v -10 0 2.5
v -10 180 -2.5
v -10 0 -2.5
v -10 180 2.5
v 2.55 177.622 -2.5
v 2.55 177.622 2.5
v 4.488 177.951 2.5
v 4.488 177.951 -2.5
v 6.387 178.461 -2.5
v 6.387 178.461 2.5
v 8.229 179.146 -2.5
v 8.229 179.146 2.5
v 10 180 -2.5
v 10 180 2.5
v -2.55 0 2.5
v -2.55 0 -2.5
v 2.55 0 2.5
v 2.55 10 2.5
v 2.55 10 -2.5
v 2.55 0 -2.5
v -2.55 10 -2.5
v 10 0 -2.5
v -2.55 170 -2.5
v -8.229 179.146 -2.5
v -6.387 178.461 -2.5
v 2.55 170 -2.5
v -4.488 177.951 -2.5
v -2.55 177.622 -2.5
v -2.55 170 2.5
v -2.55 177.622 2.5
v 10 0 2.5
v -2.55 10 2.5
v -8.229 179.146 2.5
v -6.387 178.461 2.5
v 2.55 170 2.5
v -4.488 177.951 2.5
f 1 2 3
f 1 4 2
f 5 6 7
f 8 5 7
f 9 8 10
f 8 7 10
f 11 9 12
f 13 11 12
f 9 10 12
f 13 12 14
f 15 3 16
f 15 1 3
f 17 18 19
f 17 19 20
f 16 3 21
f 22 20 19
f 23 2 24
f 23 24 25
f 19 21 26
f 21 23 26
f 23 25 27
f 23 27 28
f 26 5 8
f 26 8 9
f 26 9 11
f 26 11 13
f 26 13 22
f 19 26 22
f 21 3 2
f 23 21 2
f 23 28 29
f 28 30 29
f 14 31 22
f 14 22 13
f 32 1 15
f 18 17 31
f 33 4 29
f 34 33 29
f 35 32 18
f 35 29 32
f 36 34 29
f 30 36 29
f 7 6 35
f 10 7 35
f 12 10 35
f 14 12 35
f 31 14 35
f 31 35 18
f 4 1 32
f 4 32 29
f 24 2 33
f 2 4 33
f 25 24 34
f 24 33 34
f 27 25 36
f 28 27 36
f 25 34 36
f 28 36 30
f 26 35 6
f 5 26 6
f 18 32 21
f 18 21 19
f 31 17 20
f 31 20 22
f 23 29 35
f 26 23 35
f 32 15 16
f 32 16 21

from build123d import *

# Parameters (mm, degrees)
PAD_DEPTH = 2.5


with BuildPart() as part:
    # Sketch → Pad (new body, symmetric)
    with BuildSketch(Plane.XY):
        with BuildLine():
            Line((-10, 0), (-2.55, 0))
            Line((-2.55, 0), (-2.55, 10))
            Line((-2.55, 10), (2.55, 10))
            Line((2.55, 10), (2.55, 0))
            Line((2.55, 0), (10, 0))
            Line((10, 0), (10, 180))
            ThreePointArc((2.55, 177.621582), (6.386693, 178.460932), (10, 180))
            Line((2.55, 170), (2.55, 177.621582))
            Line((-2.55, 170), (2.55, 170))
            Line((-2.55, 177.621582), (-2.55, 170))
            ThreePointArc((-10, 180), (-6.386693, 178.460932), (-2.55, 177.621582))
            Line((-10, 180), (-10, 0))
        make_face()
    extrude(amount=PAD_DEPTH, both=True)


solid = part.part
